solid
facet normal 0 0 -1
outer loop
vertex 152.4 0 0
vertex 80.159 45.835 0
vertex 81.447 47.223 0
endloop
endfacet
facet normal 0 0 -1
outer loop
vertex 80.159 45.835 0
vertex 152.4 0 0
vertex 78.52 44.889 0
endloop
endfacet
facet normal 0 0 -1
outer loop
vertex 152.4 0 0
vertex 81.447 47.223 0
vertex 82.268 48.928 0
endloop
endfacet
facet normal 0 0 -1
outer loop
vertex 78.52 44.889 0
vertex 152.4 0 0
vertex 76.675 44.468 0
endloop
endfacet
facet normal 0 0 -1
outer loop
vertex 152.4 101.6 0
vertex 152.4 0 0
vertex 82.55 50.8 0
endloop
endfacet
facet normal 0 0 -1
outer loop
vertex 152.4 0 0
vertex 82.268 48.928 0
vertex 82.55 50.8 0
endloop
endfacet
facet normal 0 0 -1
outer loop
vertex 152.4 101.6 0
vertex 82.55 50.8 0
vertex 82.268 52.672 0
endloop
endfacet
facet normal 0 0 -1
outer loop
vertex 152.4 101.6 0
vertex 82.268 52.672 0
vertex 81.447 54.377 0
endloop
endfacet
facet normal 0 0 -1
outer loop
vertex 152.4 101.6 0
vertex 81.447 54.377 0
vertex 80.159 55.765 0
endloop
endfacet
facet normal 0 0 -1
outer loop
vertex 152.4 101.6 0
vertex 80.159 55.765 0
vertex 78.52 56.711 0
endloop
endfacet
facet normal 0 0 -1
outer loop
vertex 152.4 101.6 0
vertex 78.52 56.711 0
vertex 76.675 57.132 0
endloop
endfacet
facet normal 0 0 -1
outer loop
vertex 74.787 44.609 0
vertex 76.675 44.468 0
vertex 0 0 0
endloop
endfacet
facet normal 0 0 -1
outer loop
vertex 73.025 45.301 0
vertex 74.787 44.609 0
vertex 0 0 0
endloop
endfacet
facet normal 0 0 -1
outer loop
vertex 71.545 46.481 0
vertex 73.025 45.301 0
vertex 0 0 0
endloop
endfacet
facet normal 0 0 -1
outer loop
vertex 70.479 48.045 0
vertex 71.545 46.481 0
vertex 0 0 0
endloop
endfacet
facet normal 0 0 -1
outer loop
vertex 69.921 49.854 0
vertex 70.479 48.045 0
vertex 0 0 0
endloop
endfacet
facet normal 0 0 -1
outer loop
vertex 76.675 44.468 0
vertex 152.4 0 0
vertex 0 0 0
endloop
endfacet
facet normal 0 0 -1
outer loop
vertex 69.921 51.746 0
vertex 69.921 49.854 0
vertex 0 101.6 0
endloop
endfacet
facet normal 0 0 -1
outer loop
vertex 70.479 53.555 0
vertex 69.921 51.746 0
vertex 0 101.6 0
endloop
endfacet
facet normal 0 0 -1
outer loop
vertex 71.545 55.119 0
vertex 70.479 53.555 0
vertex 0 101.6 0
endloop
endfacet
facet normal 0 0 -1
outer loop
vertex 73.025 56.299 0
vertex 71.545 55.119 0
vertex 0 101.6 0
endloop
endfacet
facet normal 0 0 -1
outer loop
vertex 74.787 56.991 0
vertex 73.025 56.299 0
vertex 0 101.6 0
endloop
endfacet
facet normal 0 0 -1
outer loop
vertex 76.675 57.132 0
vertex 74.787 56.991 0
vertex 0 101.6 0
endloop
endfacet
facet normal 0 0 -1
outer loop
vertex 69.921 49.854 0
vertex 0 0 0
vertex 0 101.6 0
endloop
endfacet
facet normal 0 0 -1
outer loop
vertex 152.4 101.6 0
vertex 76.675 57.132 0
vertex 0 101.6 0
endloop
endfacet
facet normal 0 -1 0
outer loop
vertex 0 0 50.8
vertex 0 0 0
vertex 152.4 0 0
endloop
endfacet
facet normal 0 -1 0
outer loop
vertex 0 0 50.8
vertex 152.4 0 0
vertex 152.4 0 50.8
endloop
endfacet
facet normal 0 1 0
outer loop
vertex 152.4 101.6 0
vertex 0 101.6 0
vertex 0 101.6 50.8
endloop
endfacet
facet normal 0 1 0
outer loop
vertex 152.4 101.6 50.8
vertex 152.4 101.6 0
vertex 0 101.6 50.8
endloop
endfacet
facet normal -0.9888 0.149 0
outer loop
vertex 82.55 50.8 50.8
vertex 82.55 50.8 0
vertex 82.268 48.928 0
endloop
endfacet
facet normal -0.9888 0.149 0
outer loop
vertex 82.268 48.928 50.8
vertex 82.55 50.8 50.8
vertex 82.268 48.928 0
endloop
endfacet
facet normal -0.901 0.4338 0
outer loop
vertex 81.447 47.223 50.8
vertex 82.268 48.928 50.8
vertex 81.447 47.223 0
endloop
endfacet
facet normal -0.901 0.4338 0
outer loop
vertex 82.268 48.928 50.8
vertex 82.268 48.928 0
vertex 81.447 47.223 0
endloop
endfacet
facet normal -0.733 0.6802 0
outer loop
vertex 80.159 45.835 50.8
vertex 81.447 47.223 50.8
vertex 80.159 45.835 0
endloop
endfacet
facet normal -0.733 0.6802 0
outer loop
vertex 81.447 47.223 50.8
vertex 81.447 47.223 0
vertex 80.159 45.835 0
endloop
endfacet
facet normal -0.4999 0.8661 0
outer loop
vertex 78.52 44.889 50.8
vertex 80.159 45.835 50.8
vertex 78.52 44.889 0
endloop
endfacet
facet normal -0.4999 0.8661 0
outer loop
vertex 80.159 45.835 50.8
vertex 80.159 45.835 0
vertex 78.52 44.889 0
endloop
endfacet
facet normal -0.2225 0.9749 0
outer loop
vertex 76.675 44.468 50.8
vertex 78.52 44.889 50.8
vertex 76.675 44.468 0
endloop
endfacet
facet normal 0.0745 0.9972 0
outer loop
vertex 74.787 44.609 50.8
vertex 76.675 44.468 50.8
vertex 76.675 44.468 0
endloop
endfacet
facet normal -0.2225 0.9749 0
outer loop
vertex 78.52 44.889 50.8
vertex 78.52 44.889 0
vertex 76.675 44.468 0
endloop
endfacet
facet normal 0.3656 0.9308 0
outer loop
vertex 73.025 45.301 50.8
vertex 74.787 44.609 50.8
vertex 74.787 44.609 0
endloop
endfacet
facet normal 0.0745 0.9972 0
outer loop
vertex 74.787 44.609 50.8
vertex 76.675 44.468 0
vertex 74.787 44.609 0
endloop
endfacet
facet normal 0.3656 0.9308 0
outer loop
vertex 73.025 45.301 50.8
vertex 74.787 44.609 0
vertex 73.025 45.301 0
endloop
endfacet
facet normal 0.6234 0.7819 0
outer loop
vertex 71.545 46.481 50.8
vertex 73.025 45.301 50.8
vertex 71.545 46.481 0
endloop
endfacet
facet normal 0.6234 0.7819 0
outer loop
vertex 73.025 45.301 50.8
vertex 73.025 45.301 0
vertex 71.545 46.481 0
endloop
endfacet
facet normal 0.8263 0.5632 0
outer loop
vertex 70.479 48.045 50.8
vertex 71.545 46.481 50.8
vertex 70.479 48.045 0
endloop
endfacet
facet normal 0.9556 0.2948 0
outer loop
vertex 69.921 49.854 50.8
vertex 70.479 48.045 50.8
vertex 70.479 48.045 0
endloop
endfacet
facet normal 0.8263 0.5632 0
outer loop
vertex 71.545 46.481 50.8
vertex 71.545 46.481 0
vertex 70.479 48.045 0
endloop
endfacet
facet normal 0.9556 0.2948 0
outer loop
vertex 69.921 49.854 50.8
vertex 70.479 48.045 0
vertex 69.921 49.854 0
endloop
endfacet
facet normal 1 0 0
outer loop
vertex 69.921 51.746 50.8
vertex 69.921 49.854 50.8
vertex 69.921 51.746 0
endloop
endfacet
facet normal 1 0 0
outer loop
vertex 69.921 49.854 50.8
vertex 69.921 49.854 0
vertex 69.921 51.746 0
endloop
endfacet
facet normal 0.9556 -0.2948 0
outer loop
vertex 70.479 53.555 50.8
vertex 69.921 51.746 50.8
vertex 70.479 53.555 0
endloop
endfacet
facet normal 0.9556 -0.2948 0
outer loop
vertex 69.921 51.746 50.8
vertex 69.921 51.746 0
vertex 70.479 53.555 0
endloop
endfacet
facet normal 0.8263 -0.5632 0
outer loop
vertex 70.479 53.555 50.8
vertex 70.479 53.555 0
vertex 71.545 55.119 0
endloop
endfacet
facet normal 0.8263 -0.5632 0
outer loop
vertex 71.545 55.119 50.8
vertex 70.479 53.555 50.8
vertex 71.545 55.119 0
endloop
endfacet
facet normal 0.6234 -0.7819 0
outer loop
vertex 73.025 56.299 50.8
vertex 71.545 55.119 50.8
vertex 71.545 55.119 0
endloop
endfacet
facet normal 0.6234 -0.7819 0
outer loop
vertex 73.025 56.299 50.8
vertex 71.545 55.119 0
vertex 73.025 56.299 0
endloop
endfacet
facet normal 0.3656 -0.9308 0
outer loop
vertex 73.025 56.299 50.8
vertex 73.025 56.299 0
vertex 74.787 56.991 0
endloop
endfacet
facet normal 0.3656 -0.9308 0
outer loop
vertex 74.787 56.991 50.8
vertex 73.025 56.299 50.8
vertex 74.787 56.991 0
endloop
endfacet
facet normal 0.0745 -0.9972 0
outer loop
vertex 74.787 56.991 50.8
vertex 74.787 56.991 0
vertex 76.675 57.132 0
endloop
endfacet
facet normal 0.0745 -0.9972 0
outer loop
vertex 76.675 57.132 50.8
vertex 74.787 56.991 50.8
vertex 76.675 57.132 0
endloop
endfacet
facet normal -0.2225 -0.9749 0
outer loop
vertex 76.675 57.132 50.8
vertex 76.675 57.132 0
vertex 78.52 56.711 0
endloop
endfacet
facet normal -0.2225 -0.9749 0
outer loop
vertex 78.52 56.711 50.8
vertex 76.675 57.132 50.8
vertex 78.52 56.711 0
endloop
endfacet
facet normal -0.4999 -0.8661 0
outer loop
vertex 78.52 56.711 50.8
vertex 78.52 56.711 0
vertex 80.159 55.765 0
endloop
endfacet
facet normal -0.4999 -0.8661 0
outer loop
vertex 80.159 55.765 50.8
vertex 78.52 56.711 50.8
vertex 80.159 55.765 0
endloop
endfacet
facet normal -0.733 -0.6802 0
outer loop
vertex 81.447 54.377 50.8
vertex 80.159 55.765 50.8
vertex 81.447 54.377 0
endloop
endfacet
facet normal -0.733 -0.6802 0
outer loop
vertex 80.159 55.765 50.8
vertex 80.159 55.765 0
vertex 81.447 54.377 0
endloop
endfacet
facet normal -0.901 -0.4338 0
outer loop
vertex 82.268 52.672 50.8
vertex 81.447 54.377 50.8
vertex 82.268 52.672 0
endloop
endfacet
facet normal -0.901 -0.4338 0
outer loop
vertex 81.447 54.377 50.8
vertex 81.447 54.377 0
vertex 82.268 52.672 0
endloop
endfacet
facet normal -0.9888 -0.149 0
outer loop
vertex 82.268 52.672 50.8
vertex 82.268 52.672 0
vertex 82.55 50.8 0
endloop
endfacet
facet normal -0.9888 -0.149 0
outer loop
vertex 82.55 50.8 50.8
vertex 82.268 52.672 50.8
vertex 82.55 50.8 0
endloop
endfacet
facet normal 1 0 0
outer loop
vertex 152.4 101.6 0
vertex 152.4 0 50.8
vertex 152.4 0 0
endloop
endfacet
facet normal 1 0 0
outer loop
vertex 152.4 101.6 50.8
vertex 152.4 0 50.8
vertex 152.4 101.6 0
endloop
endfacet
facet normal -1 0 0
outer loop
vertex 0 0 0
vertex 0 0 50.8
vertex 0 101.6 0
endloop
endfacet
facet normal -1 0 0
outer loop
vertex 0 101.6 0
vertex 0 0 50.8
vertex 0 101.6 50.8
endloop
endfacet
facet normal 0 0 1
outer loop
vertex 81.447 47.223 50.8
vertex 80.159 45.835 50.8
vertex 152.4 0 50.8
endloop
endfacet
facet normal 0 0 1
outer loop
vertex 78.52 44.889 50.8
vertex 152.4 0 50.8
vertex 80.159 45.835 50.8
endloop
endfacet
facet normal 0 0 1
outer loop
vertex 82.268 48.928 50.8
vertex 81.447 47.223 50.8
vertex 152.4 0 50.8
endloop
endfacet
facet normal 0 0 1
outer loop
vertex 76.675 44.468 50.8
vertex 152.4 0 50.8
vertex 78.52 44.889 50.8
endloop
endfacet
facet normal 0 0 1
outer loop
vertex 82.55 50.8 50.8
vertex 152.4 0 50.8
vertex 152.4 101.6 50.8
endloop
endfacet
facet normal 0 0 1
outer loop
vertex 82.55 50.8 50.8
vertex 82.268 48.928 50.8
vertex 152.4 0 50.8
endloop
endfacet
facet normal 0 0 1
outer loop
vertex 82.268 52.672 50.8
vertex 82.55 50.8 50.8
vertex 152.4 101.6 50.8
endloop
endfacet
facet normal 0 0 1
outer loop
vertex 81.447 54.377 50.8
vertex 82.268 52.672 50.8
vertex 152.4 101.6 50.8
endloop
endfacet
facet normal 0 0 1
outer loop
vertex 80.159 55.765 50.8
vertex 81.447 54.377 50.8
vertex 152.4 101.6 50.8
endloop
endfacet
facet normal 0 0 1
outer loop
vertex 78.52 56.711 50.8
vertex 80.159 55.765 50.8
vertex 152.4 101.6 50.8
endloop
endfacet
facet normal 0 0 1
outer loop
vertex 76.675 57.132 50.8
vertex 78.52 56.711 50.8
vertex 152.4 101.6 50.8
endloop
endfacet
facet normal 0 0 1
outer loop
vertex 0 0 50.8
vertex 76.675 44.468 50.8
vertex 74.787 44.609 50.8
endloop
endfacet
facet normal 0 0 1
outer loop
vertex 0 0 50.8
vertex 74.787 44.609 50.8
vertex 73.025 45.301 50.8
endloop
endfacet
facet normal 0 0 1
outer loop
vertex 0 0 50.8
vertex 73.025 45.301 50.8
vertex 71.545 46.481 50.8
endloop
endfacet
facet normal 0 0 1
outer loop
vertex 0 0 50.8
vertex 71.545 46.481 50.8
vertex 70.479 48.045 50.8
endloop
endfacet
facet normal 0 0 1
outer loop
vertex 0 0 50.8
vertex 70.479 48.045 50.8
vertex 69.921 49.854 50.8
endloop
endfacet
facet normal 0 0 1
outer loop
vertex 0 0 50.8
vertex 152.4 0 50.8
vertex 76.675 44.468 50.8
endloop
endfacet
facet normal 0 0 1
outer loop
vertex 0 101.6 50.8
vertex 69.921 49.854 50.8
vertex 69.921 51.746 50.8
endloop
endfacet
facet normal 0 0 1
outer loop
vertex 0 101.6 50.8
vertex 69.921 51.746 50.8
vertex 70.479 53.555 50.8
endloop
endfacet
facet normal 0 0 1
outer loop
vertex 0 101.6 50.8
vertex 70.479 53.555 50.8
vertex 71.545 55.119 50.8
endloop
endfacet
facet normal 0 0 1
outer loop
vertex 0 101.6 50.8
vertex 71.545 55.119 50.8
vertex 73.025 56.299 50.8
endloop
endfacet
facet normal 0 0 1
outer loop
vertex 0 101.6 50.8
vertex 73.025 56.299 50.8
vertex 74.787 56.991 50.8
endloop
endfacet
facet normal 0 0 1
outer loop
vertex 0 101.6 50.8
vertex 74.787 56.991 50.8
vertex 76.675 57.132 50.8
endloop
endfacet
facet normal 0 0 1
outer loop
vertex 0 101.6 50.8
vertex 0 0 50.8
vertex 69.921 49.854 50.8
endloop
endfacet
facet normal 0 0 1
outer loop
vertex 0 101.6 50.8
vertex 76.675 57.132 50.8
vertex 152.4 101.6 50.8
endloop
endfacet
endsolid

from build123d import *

# Parameters (mm, degrees)
F0_W     = 101.6
F0_H     = 50.8
F1_DEPTH = 152.4
F2_R     = 6.35
F3_DEPTH = 50.8


with BuildPart() as f1:
    # F0 (on Right) → F1 (new body)
    with BuildSketch(Plane.YZ):
        with Locations((50.8, 25.4)):
            Rectangle(F0_W, F0_H)
    extrude(amount=F1_DEPTH)

    # F2 (on face) → F3 (cut)
    with BuildSketch(Plane(origin=(0, 0, 0), x_dir=(1, 0, 0), z_dir=(0, 0, -1))):
        with Locations((76.2, -50.8)):
            Circle(F2_R)
    extrude(amount=-F3_DEPTH, mode=Mode.SUBTRACT)


solid = f1.part
